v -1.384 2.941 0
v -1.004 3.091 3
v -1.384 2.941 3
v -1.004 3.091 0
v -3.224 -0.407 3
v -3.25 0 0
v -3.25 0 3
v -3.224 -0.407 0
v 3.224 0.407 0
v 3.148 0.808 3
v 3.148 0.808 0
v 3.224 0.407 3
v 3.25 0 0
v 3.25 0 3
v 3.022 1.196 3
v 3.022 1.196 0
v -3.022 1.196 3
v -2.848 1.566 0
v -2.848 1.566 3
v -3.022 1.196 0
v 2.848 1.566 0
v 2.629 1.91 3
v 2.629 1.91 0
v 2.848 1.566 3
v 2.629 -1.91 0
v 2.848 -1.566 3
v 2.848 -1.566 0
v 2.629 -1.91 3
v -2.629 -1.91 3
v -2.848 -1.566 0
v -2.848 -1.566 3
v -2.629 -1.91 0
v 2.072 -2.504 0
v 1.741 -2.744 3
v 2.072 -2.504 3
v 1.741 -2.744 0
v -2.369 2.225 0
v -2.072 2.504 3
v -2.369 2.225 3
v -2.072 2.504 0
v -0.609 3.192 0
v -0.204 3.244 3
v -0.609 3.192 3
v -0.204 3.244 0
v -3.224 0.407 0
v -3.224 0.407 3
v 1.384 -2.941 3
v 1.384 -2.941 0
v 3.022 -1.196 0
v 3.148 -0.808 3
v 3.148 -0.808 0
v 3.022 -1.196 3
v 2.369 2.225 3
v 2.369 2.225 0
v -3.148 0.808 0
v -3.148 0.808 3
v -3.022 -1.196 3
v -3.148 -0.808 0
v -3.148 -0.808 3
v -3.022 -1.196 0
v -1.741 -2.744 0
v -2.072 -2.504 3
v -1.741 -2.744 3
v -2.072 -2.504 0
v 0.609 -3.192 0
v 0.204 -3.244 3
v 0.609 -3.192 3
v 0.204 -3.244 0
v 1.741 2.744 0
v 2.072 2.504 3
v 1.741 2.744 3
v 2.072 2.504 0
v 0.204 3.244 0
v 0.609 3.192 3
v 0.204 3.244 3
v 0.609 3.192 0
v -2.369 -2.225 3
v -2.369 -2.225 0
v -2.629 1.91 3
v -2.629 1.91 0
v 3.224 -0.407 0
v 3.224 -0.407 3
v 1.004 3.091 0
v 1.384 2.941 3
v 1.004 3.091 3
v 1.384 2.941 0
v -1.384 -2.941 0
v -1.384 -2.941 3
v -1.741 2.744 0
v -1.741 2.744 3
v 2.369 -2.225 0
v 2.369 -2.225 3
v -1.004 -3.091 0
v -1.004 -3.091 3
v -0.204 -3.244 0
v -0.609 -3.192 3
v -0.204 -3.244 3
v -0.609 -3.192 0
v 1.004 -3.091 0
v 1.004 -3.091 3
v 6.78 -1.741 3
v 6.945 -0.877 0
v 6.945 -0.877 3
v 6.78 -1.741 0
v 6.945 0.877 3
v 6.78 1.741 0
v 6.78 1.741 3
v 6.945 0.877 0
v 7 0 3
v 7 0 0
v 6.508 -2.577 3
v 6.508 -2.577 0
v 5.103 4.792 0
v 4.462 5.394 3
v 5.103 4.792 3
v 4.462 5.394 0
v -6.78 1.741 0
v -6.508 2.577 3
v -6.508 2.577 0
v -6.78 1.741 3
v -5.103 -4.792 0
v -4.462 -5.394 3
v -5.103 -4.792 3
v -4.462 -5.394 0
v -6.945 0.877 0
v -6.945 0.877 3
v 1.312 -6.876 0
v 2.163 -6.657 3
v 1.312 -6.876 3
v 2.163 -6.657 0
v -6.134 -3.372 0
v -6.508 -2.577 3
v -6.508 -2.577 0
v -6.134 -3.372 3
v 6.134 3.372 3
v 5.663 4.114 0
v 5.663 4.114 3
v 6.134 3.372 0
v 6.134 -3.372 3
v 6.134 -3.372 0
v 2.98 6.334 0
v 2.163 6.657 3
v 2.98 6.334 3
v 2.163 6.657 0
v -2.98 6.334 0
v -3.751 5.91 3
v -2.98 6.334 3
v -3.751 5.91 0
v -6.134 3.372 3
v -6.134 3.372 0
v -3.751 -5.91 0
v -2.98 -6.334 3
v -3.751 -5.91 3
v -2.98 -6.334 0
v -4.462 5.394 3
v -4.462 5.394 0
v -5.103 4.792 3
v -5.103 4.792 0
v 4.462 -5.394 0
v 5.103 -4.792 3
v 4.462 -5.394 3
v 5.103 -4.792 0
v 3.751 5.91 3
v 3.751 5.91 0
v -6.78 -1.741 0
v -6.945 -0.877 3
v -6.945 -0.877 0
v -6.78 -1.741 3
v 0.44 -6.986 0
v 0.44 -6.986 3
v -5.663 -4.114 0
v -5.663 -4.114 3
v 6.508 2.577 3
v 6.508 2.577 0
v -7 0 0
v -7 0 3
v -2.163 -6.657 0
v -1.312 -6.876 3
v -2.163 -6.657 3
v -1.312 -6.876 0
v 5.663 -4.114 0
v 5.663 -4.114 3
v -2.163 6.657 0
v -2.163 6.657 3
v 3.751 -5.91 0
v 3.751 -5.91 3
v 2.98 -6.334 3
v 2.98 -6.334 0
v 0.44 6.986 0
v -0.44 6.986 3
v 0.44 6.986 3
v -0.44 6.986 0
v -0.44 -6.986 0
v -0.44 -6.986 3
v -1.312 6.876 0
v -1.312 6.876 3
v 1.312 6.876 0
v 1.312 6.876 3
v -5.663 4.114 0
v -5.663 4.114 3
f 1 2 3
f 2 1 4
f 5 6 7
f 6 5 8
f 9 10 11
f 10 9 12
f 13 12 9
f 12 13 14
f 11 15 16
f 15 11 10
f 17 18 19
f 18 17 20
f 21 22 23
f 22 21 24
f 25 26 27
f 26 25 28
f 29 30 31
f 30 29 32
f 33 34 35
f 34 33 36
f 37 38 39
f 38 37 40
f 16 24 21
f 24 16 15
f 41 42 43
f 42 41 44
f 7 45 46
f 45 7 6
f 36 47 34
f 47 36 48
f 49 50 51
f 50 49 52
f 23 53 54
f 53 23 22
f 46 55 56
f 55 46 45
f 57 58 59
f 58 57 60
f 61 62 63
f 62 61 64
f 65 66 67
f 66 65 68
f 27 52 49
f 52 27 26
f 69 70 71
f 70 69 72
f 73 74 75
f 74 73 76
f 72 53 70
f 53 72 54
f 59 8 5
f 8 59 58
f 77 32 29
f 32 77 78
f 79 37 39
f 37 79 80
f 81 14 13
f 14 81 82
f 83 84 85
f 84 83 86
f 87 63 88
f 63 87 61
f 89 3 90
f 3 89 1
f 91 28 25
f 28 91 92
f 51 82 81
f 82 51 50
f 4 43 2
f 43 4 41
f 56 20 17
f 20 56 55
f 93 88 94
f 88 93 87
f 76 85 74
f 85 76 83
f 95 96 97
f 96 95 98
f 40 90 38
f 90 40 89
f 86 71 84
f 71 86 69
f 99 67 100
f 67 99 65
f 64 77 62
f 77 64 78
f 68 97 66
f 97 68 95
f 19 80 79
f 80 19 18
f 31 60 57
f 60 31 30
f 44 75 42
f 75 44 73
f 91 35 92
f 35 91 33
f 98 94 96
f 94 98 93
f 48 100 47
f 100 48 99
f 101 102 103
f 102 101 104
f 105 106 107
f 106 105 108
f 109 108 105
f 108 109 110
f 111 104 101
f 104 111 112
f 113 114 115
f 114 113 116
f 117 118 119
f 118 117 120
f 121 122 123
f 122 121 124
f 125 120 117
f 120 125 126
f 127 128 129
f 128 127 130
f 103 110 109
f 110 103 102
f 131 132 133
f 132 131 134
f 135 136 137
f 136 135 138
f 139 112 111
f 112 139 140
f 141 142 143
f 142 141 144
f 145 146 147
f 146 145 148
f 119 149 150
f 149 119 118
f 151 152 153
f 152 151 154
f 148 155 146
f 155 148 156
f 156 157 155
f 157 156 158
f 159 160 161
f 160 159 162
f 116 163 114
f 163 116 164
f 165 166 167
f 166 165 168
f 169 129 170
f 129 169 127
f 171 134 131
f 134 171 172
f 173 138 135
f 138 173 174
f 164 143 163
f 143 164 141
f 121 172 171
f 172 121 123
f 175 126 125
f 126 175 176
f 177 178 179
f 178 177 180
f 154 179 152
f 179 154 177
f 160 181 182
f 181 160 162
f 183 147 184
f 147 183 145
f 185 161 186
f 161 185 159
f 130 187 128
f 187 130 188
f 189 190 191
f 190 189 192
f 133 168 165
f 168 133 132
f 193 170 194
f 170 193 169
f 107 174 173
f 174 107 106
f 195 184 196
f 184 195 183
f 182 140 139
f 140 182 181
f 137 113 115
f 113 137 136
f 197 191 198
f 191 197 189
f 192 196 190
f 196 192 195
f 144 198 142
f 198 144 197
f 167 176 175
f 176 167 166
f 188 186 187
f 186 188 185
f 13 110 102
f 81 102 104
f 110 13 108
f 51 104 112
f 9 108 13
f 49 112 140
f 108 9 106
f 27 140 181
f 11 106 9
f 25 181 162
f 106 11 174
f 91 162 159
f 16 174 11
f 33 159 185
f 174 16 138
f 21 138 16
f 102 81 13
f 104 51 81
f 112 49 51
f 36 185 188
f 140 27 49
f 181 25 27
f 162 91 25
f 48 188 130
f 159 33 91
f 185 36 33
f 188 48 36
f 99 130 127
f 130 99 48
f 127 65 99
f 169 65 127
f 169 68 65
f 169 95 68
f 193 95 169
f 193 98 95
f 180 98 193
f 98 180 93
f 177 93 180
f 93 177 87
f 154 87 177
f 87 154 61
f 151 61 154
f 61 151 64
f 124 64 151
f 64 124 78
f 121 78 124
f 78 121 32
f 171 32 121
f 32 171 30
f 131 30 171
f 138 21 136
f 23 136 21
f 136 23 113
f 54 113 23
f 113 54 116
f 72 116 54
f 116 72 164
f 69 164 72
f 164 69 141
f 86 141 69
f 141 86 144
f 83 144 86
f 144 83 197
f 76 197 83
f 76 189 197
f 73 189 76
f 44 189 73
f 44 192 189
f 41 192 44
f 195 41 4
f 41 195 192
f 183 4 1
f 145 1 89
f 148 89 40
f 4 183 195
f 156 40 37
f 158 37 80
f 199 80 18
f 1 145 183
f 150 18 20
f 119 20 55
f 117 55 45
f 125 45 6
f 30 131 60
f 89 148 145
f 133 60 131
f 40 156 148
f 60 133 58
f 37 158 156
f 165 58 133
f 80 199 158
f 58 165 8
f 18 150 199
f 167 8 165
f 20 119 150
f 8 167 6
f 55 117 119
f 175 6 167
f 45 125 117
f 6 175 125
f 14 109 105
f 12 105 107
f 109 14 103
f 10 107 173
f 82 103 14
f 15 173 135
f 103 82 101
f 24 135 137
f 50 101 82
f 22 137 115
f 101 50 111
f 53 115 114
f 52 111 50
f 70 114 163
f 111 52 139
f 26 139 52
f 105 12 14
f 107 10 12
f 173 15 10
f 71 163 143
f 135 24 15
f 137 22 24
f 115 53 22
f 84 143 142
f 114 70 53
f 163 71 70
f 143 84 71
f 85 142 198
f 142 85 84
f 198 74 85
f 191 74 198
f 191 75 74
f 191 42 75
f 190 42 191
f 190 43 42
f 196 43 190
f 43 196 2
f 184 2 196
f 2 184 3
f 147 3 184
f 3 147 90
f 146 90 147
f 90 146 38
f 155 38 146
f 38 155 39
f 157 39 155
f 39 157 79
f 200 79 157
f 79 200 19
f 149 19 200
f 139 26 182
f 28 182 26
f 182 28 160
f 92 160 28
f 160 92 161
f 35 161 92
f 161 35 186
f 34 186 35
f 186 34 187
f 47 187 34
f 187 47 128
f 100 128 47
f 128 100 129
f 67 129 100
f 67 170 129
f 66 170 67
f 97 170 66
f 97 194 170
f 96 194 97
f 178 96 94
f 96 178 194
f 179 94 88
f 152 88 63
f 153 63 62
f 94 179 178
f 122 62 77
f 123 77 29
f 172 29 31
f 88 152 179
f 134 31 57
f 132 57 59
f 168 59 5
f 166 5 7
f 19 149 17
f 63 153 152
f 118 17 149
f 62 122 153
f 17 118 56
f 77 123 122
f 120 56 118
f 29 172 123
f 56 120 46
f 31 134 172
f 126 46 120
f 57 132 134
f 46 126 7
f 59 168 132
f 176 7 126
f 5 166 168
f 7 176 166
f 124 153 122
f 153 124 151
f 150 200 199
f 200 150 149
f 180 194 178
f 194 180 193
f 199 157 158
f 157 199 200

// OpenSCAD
$fn = 50;


difference() {
	union() {
		cylinder(h = 3, r = 7.0000000000);
	}
	union() {
		translate(v = [0.0000000000, 0.0000000000, -100.0000000000]) {
			cylinder(h = 200, r = 3.2500000000);
		}
		cylinder(h = 3, r = 1.8000000000);
		cylinder(h = 3, r = 1.8000000000);
		cylinder(h = 3, r = 1.8000000000);
	}
}
